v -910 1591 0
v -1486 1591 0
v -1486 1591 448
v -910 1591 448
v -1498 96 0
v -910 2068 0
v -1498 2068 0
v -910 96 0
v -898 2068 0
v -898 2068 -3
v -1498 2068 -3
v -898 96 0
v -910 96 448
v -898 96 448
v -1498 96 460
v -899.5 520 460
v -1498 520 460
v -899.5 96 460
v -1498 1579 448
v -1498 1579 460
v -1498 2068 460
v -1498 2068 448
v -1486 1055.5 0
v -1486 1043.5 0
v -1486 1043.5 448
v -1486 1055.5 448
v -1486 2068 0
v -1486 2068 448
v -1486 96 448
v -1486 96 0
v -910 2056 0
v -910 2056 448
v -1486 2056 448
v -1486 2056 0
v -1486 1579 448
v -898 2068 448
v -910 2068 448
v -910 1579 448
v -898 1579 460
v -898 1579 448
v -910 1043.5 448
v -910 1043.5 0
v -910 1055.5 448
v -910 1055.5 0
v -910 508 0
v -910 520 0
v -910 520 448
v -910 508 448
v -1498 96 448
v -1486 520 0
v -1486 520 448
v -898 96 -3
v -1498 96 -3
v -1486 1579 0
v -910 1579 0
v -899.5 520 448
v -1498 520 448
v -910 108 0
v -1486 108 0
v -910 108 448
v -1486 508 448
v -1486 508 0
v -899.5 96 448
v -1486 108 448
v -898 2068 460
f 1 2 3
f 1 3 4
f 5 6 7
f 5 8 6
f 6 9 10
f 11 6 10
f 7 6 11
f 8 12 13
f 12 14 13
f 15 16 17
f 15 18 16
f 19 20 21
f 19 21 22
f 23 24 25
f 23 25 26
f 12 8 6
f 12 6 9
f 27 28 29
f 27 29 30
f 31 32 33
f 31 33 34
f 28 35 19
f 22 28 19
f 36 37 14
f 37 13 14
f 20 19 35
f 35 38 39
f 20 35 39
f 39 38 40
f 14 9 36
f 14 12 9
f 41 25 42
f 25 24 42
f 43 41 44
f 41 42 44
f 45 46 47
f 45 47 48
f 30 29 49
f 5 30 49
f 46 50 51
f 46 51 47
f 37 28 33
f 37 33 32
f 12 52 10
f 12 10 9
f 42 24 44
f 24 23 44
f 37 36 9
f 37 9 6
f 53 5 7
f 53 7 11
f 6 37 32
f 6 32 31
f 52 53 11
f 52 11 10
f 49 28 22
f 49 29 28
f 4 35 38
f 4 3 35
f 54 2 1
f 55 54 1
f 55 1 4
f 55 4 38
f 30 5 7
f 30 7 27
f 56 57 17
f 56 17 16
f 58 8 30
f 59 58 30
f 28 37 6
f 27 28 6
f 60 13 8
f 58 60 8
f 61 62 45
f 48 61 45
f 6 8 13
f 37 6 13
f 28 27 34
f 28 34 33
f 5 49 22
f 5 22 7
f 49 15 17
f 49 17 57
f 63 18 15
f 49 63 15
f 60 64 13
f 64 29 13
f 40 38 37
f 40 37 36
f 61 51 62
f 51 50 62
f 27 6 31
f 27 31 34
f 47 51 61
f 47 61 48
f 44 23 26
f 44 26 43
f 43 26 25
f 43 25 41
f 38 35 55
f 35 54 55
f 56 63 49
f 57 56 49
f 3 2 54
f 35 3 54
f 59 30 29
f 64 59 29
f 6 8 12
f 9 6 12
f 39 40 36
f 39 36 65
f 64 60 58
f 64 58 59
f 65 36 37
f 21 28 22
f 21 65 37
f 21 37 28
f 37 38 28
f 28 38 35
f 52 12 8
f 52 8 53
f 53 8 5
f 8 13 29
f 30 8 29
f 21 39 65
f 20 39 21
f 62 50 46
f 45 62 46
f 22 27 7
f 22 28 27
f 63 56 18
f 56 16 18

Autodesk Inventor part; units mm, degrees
ref_plane "YZ Plane" through (0, 0, 0) normal (1, 0, 0) x (0, 1, 0)
sketch "Sketch1" plane through (0, 0, 0) normal (0, 0, 1) x (1, 0, 0)
  line L0 (-1498, 0) -> (1498, 0) construction
  line L1 (-1498, 0) -> (-898, 0)
  line L2 (-898, 0) -> (-898, 2068)
  line L3 (-898, 2068) -> (-1498, 2068)
  line L4 (-1498, 2068) -> (-1498, 0)
  line L5 (-898, 0) -> (-498, 0)
  line L6 (-498, 0) -> (-498, 816)
  line L7 (-498, 816) -> (-898, 816)
  line L8 (-898, 816) -> (-898, 0)
  line L9 (-498, 0) -> (102, 0)
  line L10 (102, 0) -> (102, 816)
  line L11 (102, 816) -> (-498, 816)
  line L12 (-498, 816) -> (-498, 0)
  line L13 (102, 0) -> (698, 0)
  line L14 (698, 0) -> (698, 668)
  line L15 (698, 668) -> (102, 668)
  line L16 (102, 668) -> (102, 0)
  line L17 (698, 0) -> (1498, 0)
  line L18 (1498, 0) -> (1498, 816)
  line L19 (1498, 816) -> (698, 816)
  line L20 (698, 816) -> (698, 0)
  line L21 (-1498, 0) -> (1498, 0)
  line L22 (1498, 0) -> (1498, 96)
  line L23 (1498, 96) -> (-1498, 96)
  line L24 (-1498, 96) -> (-1498, 0)
  line L25 (-898, 816) -> (1498, 816)
  line L26 (1498, 816) -> (1498, 832)
  line L27 (1498, 832) -> (-898, 832)
  line L28 (-898, 832) -> (-898, 816)
  line L29 (-898, 1972) -> (-498, 1972)
  line L30 (-498, 1972) -> (-498, 1372)
  line L31 (-498, 1372) -> (-898, 1372)
  line L32 (-898, 1372) -> (-898, 1972)
  line L33 (698, 1972) -> (1498, 1972)
  line L34 (1498, 1972) -> (1498, 1372)
  line L35 (1498, 1372) -> (698, 1372)
  line L36 (698, 1372) -> (698, 1972)
  line L37 (698, 1372) -> (98, 1372)
  line L38 (98, 1372) -> (98, 1972)
  line L39 (98, 1972) -> (698, 1972)
  line L40 (698, 1972) -> (698, 1372)
  line L41 (-498, 1372) -> (98, 1372)
  line L42 (-498, 1372) -> (-275, 1637.7611)
  line L43 (98, 1372) -> (-125, 1637.7611)
  line L44 (-275, 1637.7611) -> (-125, 1637.7611)
  line L45 (-125, 1637.7611) -> (-125, 2068)
  line L46 (-125, 2068) -> (-275, 2068)
  line L47 (-275, 2068) -> (-275, 1637.7611)
  line L48 (1098, 816) -> (1098, 96)
  line L49 (-198, 816) -> (-198, 96)
  line L50 (-898, 668) -> (-498, 668)
  line L51 (-1498, 520) -> (-898, 520)
  line L52 (-1498, 1579) -> (-898, 1579)
  line L53 (398, 1972) -> (398, 1372)
  line L54 (1098, 1972) -> (1098, 1372)
  line L55 (698, 1876) -> (1498, 1876)
  line L56 (698, 1468) -> (1498, 1468)
  line L57 (-1498, 1049.5) -> (-898, 1049.5)
  point P0 (0, 0)
  point P1 (0, 0)
  point P2 (0, 0)
  point P3 (1098, 816)
  point P4 (-198, 816)
  point P5 (0, 0)
  dimension "d0" = 2996
  dimension "d1" = 600
  dimension "d2" = 2068
  dimension "d3" = 400
  dimension "d4" = 816
  dimension "d5" = 600
  dimension "d6" = 816
  dimension "d7" = 596
  dimension "d8" = 668
  dimension "d9" = 800
  dimension "d10" = 816
  dimension "d11" = 96
  dimension "d12" = 16
  dimension "d13" = 400
  dimension "d14" = 600
  dimension "d15" = 96
  dimension "d16" = 800
  dimension "d17" = 600
  dimension "d18" = 600
  dimension "d19" = 600
  dimension "d20" = 50
  dimension "d21" = 150
  dimension "d22" = 148
  dimension "d23" = 1059
  dimension "d24" = 96
  dimension "d25" = 96
  dimension "d26" = 529.5
ref_plane "Work Plane1" through (1498, 96, 0) normal (0, 1, 0) x (-1, 0, 0)
sketch "Sketch2" plane through (1498, 96, 0) normal (0, 1, 0) x (-1, 0, 0)
  line L0 (2996, 0) -> (2396, 0)
  line L1 (2396, 0) -> (2396, 460)
  line L2 (2396, 460) -> (2996, 460)
  line L3 (2996, 460) -> (2996, 0)
  line L4 (2984, 12) -> (2408, 12)
  line L5 (2408, 12) -> (2408, 448)
  line L6 (2408, 448) -> (2984, 448)
  line L7 (2984, 448) -> (2984, 12)
  line L8 (2984, 12) -> (2984, 0)
  line L9 (2408, 12) -> (2408, 0)
  line L10 (2984, 448) -> (2996, 448)
  line L11 (2408, 448) -> (2396, 448)
  point P0 (1498, 0)
  point P1 (2396, 0)
  point P2 (2396, 0)
  point P3 (2396, 0)
  point P4 (2996, 0)
  dimension "d28" = 460
  dimension "d29" = 12
extrude "Extrusion1" add sketch "Sketch2" along normal up to surface (1972 mm away) contours L0 L8 L7 L10 L3 | L0 L1 L11 L5 L9
extrude "Extrusion2" add sketch "Sketch2" along normal up to surface (1972 mm away) separate body contours L10 L6 L11 L1 L2 L3
split body "Split1" sketch "Sketch1" result two bodies bodies 2 curves L52 first body at (-1098, 1742, 459.5)
split body "Split2" sketch "Sketch1" result one side removed bodies 4 curves L51 removed pieces at (-1298, 1226, 459.5)
sketch "Sketch3" plane through (1498, 96, 0) normal (0, 1, 0) x (-1, 0, 0)
  line L0 (2408, 0) -> (2396, 0) projected
  line L1 (2396, 0) -> (2996, 0)
  line L2 (2996, 0) -> (2996, -3)
  line L3 (2996, -3) -> (2396, -3)
  line L4 (2396, -3) -> (2396, 0)
  point P0 (1498, 0)
  dimension "d34" = 3
extrude "Extrusion3" add sketch "Sketch3" along normal up to surface (1972 mm away) separate body
sketch "Sketch4" plane through (1498, 96, 0) normal (0, 1, 0) x (-1, 0, 0)
  line L0 (2984, 0) -> (2984, 448) projected
  line L1 (2408, 448) -> (2408, 0) projected
  line L2 (2396, 0) -> (2996, 0) projected
  line L3 (2996, 448) -> (2396, 448) projected
  point P0 (1498, 0)
extrude "Extrusion4" add sketch "Sketch4" along normal blind 12 separate body
ref_plane "Work Plane2" through (-1498, 2068, 112) normal (0, -1, 0) x (0, 0, -1)
sketch "Sketch5" plane through (-1498, 2068, 112) normal (0, -1, 0) x (0, 0, -1)
  line L0 (112, 12) -> (-336, 12) projected
  line L1 (-336, 588) -> (112, 588) projected
  line L2 (-336, 0) -> (-336, 600) projected
  line L3 (112, 600) -> (112, 0) projected
  point P0 (112, 1498)
extrude "Extrusion5" add sketch "Sketch5" along normal blind 12 separate body
sketch "Sketch6" plane through (-1498, 96, 0) normal (0, 0, 1) x (1, 0, 0)
  line L0 (0, 1483) -> (600, 1483) projected
  line L1 (0, 953.5) -> (600, 953.5) projected
  line L2 (0, 424) -> (600, 424) projected
  line L3 (0, 1495) -> (600, 1495)
  line L4 (0, 412) -> (600, 412)
  line L5 (0, 959.5) -> (600, 959.5)
  line L6 (0, 947.5) -> (600, 947.5)
  line L7 (12, 0) -> (12, 1972) projected
  line L8 (588, 0) -> (588, 1972) projected
  line L9 (12, 1495) -> (12, 1483)
  line L10 (588, 1495) -> (588, 1483)
  line L11 (12, 959.5) -> (12, 947.5)
  line L12 (588, 959.5) -> (588, 947.5)
  line L13 (588, 424) -> (588, 412)
  line L14 (12, 424) -> (12, 412)
  point P0 (1498, -96)
  dimension "d41" = 12
  dimension "d42" = 12
  dimension "d43" = 6
  dimension "d44" = 6
extrude "Extrusion6" add sketch "Sketch6" along normal up to surface (448 mm away) separate body contours L7 L3 L8 L0 | L5 L8 L1 L7 | L1 L8 L6 L7 | L2 L8 L4 L7
sketch "Sketch8" plane through (-1498, 96, 460) normal (0, 0, 1) x (1, 0, 0)
  line L0 (600, 424) -> (0, 424) projected
  line L1 (600, 424) -> (0, 424) projected
  line L2 (0, 0) -> (0, 424) projected
  line L3 (0, 0) -> (600, 0) projected
  line L4 (600, 0) -> (600, 424) projected
  line L5 (600, 424) -> (598.5, 424)
  line L6 (598.5, 424) -> (598.5, 0)
  line L7 (598.5, 0) -> (600, 0)
  line L8 (600, 0) -> (600, 424)
  point P0 (1498, -96)
  point P1 (598.5, 424)
  point P2 (600, 424)
  dimension "d50" = 1.5
extrude "Extrusion8" cut sketch "Sketch8" against normal blind 12 contours L4 L3 L6 L0 bodies 4
properties part number "Base Cabinet 1"
